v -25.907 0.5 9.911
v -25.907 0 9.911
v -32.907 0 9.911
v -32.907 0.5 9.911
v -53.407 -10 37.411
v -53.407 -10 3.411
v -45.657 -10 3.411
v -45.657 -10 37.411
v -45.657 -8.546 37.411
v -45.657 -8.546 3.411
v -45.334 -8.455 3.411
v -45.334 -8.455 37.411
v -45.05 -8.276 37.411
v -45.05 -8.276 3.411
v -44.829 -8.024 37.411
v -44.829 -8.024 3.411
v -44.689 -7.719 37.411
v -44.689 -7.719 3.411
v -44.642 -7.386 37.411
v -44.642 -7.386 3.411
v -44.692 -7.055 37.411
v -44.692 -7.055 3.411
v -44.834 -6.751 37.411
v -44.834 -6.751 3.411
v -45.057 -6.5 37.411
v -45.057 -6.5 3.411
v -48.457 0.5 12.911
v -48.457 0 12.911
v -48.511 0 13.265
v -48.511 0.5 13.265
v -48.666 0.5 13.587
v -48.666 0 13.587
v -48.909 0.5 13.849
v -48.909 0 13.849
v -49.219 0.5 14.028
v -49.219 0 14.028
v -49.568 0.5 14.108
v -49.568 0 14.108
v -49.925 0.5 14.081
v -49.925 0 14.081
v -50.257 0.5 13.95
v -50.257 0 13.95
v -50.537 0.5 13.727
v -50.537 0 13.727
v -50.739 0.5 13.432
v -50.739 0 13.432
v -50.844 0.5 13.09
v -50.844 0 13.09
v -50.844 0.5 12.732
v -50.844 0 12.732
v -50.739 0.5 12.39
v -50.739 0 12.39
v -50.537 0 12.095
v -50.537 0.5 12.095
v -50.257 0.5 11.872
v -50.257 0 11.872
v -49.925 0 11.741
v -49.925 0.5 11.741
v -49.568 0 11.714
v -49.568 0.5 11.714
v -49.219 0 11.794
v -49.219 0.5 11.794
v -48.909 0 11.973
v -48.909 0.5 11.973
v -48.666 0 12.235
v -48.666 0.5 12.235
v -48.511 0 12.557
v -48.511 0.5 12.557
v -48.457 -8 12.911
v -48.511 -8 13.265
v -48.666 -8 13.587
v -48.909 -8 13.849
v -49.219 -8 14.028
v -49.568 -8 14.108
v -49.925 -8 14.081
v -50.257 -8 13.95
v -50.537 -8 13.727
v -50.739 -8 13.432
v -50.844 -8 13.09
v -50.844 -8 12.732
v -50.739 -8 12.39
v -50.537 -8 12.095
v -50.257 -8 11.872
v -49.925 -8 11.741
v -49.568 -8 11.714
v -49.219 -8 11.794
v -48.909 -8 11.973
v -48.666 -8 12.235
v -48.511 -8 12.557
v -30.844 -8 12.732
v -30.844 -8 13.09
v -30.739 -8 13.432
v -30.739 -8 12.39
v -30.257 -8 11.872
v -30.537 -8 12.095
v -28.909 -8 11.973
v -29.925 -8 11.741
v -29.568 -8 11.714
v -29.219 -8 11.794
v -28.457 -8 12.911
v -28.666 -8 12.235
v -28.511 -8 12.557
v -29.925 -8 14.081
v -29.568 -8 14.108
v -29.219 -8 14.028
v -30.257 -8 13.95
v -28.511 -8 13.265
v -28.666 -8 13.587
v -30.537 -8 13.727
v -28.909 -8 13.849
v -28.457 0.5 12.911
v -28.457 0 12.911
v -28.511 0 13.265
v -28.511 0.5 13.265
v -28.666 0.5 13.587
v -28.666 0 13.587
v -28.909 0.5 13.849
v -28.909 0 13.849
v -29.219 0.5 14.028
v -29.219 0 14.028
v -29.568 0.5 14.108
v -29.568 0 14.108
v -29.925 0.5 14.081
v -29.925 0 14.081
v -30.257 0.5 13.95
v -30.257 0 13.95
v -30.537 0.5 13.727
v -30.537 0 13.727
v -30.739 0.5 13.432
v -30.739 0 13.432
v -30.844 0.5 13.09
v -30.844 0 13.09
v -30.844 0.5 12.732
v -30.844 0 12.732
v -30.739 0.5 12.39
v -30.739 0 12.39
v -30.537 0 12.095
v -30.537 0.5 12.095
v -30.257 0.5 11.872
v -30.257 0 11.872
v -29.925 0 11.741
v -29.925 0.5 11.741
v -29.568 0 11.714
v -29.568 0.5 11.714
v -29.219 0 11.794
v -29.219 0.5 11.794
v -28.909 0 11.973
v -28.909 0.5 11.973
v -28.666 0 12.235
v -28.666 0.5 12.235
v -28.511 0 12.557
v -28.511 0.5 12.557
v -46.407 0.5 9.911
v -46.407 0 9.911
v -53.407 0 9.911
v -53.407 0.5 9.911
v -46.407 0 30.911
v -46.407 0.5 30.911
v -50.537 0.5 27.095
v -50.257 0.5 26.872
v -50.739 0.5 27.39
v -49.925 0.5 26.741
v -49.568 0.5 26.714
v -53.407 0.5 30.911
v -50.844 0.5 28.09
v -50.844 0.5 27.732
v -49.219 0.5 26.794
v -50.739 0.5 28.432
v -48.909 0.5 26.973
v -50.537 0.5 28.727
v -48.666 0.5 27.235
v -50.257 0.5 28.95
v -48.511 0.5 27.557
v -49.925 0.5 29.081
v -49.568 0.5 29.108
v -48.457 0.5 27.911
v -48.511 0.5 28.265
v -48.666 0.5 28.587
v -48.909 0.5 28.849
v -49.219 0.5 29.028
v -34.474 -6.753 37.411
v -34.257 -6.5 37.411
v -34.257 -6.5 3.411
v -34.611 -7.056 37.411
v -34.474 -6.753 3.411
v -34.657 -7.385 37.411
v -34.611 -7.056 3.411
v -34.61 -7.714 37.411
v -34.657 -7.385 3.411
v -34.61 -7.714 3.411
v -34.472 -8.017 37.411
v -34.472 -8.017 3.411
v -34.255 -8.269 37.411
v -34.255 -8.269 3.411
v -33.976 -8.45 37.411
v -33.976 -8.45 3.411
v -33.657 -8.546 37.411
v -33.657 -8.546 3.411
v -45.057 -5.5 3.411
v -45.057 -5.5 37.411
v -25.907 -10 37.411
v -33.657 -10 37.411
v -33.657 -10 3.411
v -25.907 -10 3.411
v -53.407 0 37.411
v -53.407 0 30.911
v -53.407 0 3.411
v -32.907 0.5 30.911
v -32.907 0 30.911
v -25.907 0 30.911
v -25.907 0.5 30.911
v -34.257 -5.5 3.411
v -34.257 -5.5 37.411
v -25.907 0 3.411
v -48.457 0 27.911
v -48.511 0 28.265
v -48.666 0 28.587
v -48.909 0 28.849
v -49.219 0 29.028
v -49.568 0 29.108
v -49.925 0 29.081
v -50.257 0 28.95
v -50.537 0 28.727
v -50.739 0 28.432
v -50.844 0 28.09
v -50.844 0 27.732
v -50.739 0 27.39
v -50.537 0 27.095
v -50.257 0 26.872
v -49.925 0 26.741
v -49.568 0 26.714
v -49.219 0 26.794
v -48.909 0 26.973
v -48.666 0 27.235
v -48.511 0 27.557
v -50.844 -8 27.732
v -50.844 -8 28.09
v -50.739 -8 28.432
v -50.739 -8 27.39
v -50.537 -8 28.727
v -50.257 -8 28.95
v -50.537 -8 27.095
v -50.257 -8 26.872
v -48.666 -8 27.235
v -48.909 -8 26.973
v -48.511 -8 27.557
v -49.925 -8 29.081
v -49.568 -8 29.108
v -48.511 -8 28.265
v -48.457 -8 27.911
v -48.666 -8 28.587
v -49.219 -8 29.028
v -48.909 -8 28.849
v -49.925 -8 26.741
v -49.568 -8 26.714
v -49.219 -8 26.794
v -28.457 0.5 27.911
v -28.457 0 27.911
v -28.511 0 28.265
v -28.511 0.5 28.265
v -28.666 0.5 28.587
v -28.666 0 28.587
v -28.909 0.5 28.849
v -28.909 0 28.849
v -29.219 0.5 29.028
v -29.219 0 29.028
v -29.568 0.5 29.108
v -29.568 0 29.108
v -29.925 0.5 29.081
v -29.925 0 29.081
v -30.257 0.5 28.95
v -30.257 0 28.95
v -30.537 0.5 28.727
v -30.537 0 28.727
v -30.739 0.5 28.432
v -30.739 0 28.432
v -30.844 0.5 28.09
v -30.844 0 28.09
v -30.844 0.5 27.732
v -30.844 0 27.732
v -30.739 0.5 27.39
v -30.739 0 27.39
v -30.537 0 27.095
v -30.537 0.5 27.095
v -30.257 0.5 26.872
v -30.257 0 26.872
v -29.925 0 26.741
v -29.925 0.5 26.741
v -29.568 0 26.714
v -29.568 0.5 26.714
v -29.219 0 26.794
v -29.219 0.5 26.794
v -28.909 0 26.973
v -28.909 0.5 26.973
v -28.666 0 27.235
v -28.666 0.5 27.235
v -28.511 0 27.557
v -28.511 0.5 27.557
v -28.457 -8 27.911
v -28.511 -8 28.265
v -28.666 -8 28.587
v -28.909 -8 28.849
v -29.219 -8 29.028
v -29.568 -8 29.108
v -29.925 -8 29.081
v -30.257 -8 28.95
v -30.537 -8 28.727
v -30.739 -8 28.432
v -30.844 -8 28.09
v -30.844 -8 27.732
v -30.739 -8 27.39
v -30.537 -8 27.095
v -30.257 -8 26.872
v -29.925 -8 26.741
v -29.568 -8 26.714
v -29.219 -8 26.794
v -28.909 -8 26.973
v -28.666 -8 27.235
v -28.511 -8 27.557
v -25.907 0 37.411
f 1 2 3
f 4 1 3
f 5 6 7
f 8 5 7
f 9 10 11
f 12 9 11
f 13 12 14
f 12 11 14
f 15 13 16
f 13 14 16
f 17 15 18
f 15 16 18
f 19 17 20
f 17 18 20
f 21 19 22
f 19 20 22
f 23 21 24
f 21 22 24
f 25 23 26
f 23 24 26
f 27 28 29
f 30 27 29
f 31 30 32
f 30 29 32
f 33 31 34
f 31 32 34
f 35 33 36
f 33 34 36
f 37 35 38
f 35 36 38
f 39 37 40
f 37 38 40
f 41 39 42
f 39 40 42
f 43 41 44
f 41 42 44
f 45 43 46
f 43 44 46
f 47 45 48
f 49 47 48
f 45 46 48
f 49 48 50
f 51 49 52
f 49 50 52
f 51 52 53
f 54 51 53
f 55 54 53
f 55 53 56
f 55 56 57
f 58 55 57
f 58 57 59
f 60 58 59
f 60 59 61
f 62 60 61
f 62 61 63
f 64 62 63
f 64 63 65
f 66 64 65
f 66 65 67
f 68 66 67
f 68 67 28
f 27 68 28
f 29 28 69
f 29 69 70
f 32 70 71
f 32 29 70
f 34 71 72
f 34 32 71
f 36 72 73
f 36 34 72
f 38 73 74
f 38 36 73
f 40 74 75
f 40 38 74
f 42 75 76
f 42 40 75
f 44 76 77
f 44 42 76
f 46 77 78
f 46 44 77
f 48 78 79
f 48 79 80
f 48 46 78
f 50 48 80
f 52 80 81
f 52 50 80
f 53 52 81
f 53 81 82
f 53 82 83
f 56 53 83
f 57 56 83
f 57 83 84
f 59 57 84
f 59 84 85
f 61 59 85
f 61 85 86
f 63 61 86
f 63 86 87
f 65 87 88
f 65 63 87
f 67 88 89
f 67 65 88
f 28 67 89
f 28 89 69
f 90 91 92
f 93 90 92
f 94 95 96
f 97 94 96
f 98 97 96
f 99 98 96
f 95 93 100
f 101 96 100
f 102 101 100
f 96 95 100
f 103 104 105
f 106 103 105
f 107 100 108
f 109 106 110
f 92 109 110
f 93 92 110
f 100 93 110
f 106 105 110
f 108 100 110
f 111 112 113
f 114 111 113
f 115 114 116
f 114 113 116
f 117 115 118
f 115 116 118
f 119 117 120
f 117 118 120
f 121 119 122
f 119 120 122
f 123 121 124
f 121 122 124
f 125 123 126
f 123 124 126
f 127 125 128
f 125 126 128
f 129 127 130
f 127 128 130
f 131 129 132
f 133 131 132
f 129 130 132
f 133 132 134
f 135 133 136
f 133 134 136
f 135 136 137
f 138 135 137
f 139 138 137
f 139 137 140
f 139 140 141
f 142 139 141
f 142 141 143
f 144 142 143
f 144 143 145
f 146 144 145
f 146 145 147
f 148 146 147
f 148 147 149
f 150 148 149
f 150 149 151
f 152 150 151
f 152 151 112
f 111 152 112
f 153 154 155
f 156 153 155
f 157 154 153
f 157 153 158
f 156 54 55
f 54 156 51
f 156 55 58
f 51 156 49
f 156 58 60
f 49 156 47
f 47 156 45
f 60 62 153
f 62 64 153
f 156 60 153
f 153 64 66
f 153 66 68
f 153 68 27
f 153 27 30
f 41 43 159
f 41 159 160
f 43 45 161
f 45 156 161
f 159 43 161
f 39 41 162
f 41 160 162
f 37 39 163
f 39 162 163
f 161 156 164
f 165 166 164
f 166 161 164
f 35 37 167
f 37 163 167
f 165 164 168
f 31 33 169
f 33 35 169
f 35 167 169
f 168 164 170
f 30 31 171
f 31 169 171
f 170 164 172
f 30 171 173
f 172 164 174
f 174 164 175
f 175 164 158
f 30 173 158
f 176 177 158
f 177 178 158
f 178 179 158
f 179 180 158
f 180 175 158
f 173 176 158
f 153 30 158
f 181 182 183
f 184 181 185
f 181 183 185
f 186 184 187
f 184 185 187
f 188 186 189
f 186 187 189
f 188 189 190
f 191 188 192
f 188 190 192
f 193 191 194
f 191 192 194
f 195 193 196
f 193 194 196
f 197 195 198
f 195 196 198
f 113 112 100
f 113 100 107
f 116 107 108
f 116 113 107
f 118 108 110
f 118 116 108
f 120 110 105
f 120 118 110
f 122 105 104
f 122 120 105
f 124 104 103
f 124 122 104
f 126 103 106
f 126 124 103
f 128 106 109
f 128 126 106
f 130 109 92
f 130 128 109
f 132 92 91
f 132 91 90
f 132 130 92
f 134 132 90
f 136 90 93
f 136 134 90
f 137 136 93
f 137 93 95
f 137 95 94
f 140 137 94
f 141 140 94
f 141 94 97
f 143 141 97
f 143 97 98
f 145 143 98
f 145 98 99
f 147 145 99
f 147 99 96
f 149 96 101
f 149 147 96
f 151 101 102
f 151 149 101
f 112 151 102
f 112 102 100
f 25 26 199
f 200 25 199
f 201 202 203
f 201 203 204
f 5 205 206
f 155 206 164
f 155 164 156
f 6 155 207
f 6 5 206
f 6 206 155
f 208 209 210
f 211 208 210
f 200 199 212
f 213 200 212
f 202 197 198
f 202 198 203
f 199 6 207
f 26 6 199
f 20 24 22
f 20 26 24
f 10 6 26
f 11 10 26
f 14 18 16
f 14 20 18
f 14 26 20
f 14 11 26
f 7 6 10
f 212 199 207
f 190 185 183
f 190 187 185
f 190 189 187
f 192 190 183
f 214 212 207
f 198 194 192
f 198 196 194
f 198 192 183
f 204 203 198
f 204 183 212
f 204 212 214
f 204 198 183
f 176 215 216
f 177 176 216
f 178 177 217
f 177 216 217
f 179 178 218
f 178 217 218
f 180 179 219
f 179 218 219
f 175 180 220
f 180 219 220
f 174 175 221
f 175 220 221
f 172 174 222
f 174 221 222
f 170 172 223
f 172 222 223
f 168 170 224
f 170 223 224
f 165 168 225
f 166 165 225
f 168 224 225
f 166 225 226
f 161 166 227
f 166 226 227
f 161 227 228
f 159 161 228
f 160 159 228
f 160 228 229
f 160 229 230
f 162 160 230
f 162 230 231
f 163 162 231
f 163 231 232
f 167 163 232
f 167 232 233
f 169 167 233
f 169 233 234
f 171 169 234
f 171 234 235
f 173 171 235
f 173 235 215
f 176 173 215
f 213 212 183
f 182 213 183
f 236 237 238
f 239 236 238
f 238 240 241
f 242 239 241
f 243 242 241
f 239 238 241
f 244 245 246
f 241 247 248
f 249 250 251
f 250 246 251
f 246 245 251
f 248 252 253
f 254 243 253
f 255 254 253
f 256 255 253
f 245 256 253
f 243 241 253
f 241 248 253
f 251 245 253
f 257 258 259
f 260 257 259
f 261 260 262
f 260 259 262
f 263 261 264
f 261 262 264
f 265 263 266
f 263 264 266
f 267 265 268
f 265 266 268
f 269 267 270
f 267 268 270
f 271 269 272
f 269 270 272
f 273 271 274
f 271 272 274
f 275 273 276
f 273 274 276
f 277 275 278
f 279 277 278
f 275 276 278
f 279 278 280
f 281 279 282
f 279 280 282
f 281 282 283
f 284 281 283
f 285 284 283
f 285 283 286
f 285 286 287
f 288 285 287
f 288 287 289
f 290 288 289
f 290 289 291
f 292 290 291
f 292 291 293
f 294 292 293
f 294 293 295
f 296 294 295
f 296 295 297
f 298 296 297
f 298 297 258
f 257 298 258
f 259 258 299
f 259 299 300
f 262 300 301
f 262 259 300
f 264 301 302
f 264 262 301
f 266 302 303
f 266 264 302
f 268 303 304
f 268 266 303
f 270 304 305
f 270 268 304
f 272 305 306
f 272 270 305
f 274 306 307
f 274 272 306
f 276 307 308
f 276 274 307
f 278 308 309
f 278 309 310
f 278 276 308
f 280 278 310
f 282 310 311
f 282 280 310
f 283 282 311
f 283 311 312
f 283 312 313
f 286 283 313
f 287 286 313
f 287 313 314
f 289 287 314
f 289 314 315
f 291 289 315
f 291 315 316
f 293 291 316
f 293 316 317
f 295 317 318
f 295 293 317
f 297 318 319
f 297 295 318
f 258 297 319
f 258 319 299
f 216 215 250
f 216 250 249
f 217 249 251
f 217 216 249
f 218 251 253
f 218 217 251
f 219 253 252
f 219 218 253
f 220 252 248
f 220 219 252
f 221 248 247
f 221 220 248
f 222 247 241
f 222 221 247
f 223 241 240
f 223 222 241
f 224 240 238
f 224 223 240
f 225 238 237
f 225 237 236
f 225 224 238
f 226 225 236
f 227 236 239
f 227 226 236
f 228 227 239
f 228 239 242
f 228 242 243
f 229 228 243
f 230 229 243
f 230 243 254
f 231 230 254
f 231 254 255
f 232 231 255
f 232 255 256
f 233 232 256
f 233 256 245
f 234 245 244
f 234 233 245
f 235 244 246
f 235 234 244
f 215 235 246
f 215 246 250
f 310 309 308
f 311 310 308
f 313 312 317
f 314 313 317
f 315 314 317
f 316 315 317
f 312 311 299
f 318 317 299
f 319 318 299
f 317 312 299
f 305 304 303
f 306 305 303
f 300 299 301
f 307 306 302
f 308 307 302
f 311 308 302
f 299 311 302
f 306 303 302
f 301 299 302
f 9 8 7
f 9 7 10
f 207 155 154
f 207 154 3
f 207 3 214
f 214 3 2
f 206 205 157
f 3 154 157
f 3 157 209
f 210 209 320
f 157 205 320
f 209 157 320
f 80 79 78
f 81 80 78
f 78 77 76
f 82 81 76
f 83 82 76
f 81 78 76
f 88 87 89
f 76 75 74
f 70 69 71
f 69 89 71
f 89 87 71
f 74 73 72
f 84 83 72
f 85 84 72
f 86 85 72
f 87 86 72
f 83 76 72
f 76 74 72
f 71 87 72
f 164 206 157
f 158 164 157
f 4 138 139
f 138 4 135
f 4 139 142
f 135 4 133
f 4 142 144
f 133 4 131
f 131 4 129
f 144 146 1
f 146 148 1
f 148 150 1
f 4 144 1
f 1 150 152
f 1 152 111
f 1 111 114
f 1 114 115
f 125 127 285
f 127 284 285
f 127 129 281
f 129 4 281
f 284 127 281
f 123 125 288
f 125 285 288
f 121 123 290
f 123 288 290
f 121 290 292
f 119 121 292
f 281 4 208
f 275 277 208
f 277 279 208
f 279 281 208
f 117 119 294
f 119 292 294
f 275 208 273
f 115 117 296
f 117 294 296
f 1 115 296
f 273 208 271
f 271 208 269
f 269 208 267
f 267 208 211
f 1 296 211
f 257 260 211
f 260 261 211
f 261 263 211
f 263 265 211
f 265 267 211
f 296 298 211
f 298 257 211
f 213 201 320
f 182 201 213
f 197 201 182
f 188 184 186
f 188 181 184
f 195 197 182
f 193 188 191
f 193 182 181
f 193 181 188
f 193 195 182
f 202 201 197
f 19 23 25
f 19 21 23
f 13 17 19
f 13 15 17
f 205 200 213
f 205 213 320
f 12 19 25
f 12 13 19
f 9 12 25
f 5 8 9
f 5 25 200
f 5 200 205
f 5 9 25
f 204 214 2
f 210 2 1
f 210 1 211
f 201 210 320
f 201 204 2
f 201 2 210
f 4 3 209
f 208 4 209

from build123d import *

# Parameters (mm, degrees)
F0_W          = 7
F0_H          = 6.5
F0_W_2        = 13.5
F0_H_2        = 21
F0_R          = 1.2
F1_DEPTH      = 10
F1_FACE_W     = 27.5
F1_FACE_H     = 34
F2_DEPTH      = 0.5
F3_DEPTH      = 1
F4_DEPTH      = 8
F4_DEPTH_BACK = 1
F6_DEPTH      = 34.001


with BuildPart() as f1:
    # F0 (on Front) → F1 (new body)
    with BuildSketch(Plane.XZ):
        with Locations((-49.9074855894, 34.1609876885)):
            Rectangle(F0_W, F0_H)
        with Locations((-39.6574855894, 34.1609876885)):
            Rectangle(F0_W_2, F0_H)
        with Locations((-49.9074855894, 20.4109876885)):
            Rectangle(F0_W, F0_H_2)
        with Locations((-49.6574855894, 12.9109876885)):
            Circle(F0_R, mode=Mode.SUBTRACT)
        with Locations((-49.6574855894, 27.9109876885)):
            Circle(F0_R, mode=Mode.SUBTRACT)
        with Locations((-29.4074855894, 34.1609876885)):
            Rectangle(F0_W, F0_H)
        with Locations((-49.9074855894, 6.6609876885)):
            Rectangle(F0_W, F0_H)
        with Locations((-29.4074855894, 20.4109876885)):
            Rectangle(F0_W, F0_H_2)
        with Locations((-29.6574855894, 12.9109876885)):
            Circle(F0_R, mode=Mode.SUBTRACT)
        with Locations((-29.6574855894, 27.9109876885)):
            Circle(F0_R, mode=Mode.SUBTRACT)
        with Locations((-39.6574855894, 6.6609876885)):
            Rectangle(F0_W_2, F0_H)
        with Locations((-29.4074855894, 6.6609876885)):
            Rectangle(F0_W, F0_H)
        with Locations((-39.6574855894, 20.4109876885)):
            Rectangle(F0_W_2, F0_H_2)
        with Locations((-49.6574855894, 27.9109876885)):
            Circle(F0_R)
        with Locations((-49.6574855894, 12.9109876885)):
            Circle(F0_R)
        with Locations((-29.6574855894, 12.9109876885)):
            Circle(F0_R)
        with Locations((-29.6574855894, 27.9109876885)):
            Circle(F0_R)
    extrude(amount=F1_DEPTH)

    # F0 (on Front) + F1_face (on face) → F2 (join)
    with BuildSketch(Plane.XZ):
        with Locations((-49.9074855894, 34.1609876885)):
            Rectangle(F0_W, F0_H)
        with Locations((-39.6574855894, 34.1609876885)):
            Rectangle(F0_W_2, F0_H)
        with Locations((-49.9074855894, 20.4109876885)):
            Rectangle(F0_W, F0_H_2)
        with Locations((-49.6574855894, 12.9109876885)):
            Circle(F0_R, mode=Mode.SUBTRACT)
        with Locations((-49.6574855894, 27.9109876885)):
            Circle(F0_R, mode=Mode.SUBTRACT)
        with Locations((-29.4074855894, 34.1609876885)):
            Rectangle(F0_W, F0_H)
        with Locations((-49.9074855894, 6.6609876885)):
            Rectangle(F0_W, F0_H)
        with Locations((-29.4074855894, 20.4109876885)):
            Rectangle(F0_W, F0_H_2)
        with Locations((-29.6574855894, 12.9109876885)):
            Circle(F0_R, mode=Mode.SUBTRACT)
        with Locations((-29.6574855894, 27.9109876885)):
            Circle(F0_R, mode=Mode.SUBTRACT)
        with Locations((-39.6574855894, 6.6609876885)):
            Rectangle(F0_W_2, F0_H)
        with Locations((-29.4074855894, 6.6609876885)):
            Rectangle(F0_W, F0_H)
        with Locations((-29.6574855894, 27.9109876885)):
            Circle(F0_R)
        with Locations((-49.6574855894, 27.9109876885)):
            Circle(F0_R)
        with Locations((-49.6574855894, 12.9109876885)):
            Circle(F0_R)
        with Locations((-29.6574855894, 12.9109876885)):
            Circle(F0_R)
    with BuildSketch(Plane(origin=(-39.6574855894, -10, 20.4109876885), x_dir=(1, 0, 0), z_dir=(0, -1, 0))):
        Rectangle(F1_FACE_W, F1_FACE_H)
    extrude(amount=-F2_DEPTH)

    # F0 (on Front) → F3 (cut)
    with BuildSketch(Plane.XZ):
        with Locations((-29.4074855894, 34.1609876885)):
            Rectangle(F0_W, F0_H)
        with Locations((-39.6574855894, 34.1609876885)):
            Rectangle(F0_W_2, F0_H)
        with Locations((-49.9074855894, 34.1609876885)):
            Rectangle(F0_W, F0_H)
        with Locations((-49.9074855894, 6.6609876885)):
            Rectangle(F0_W, F0_H)
        with Locations((-39.6574855894, 6.6609876885)):
            Rectangle(F0_W_2, F0_H)
        with Locations((-29.4074855894, 6.6609876885)):
            Rectangle(F0_W, F0_H)
    extrude(amount=-F3_DEPTH, mode=Mode.SUBTRACT)

    # F0 (on Front) → F4 (cut, two sides)
    with BuildSketch(Plane.XZ) as f4_sk:
        with Locations((-29.6574855894, 27.9109876885)):
            Circle(F0_R)
        with Locations((-29.6574855894, 12.9109876885)):
            Circle(F0_R)
        with Locations((-49.6574855894, 12.9109876885)):
            Circle(F0_R)
        with Locations((-49.6574855894, 27.9109876885)):
            Circle(F0_R)
    extrude(amount=F4_DEPTH, mode=Mode.SUBTRACT)
    extrude(f4_sk.sketch, amount=-F4_DEPTH_BACK, mode=Mode.SUBTRACT)

    # F5 (on face) → F6 (cut, through all)
    with BuildSketch(Plane(origin=(0, 0, 3.4109876885), x_dir=(1, 0, 0), z_dir=(0, 0, -1))):
        with BuildLine():
            Line((-33.6574855894, 8.5455439207), (-33.6574855894, 10))
            Line((-33.6574855894, 10), (-45.6574855894, 10))
            Line((-45.6574855894, 10), (-45.6574855894, 8.5455439207))
            ThreePointArc((-45.6574855894, 8.5455439207), (-44.6894279438, 7.7187269742), (-45.0574855894, 6.5))
            Line((-45.0574855894, 6.5), (-45.0574855894, 5.5))
            Line((-45.0574855894, 5.5), (-34.2574855894, 5.5))
            Line((-34.2574855894, 5.5), (-34.2574855894, 6.5))
            ThreePointArc((-34.2574855894, 6.5), (-34.6099684918, 7.7141585825), (-33.6574855894, 8.5455439207))
        make_face()
    extrude(amount=-F6_DEPTH, mode=Mode.SUBTRACT)


solid = f1.part
